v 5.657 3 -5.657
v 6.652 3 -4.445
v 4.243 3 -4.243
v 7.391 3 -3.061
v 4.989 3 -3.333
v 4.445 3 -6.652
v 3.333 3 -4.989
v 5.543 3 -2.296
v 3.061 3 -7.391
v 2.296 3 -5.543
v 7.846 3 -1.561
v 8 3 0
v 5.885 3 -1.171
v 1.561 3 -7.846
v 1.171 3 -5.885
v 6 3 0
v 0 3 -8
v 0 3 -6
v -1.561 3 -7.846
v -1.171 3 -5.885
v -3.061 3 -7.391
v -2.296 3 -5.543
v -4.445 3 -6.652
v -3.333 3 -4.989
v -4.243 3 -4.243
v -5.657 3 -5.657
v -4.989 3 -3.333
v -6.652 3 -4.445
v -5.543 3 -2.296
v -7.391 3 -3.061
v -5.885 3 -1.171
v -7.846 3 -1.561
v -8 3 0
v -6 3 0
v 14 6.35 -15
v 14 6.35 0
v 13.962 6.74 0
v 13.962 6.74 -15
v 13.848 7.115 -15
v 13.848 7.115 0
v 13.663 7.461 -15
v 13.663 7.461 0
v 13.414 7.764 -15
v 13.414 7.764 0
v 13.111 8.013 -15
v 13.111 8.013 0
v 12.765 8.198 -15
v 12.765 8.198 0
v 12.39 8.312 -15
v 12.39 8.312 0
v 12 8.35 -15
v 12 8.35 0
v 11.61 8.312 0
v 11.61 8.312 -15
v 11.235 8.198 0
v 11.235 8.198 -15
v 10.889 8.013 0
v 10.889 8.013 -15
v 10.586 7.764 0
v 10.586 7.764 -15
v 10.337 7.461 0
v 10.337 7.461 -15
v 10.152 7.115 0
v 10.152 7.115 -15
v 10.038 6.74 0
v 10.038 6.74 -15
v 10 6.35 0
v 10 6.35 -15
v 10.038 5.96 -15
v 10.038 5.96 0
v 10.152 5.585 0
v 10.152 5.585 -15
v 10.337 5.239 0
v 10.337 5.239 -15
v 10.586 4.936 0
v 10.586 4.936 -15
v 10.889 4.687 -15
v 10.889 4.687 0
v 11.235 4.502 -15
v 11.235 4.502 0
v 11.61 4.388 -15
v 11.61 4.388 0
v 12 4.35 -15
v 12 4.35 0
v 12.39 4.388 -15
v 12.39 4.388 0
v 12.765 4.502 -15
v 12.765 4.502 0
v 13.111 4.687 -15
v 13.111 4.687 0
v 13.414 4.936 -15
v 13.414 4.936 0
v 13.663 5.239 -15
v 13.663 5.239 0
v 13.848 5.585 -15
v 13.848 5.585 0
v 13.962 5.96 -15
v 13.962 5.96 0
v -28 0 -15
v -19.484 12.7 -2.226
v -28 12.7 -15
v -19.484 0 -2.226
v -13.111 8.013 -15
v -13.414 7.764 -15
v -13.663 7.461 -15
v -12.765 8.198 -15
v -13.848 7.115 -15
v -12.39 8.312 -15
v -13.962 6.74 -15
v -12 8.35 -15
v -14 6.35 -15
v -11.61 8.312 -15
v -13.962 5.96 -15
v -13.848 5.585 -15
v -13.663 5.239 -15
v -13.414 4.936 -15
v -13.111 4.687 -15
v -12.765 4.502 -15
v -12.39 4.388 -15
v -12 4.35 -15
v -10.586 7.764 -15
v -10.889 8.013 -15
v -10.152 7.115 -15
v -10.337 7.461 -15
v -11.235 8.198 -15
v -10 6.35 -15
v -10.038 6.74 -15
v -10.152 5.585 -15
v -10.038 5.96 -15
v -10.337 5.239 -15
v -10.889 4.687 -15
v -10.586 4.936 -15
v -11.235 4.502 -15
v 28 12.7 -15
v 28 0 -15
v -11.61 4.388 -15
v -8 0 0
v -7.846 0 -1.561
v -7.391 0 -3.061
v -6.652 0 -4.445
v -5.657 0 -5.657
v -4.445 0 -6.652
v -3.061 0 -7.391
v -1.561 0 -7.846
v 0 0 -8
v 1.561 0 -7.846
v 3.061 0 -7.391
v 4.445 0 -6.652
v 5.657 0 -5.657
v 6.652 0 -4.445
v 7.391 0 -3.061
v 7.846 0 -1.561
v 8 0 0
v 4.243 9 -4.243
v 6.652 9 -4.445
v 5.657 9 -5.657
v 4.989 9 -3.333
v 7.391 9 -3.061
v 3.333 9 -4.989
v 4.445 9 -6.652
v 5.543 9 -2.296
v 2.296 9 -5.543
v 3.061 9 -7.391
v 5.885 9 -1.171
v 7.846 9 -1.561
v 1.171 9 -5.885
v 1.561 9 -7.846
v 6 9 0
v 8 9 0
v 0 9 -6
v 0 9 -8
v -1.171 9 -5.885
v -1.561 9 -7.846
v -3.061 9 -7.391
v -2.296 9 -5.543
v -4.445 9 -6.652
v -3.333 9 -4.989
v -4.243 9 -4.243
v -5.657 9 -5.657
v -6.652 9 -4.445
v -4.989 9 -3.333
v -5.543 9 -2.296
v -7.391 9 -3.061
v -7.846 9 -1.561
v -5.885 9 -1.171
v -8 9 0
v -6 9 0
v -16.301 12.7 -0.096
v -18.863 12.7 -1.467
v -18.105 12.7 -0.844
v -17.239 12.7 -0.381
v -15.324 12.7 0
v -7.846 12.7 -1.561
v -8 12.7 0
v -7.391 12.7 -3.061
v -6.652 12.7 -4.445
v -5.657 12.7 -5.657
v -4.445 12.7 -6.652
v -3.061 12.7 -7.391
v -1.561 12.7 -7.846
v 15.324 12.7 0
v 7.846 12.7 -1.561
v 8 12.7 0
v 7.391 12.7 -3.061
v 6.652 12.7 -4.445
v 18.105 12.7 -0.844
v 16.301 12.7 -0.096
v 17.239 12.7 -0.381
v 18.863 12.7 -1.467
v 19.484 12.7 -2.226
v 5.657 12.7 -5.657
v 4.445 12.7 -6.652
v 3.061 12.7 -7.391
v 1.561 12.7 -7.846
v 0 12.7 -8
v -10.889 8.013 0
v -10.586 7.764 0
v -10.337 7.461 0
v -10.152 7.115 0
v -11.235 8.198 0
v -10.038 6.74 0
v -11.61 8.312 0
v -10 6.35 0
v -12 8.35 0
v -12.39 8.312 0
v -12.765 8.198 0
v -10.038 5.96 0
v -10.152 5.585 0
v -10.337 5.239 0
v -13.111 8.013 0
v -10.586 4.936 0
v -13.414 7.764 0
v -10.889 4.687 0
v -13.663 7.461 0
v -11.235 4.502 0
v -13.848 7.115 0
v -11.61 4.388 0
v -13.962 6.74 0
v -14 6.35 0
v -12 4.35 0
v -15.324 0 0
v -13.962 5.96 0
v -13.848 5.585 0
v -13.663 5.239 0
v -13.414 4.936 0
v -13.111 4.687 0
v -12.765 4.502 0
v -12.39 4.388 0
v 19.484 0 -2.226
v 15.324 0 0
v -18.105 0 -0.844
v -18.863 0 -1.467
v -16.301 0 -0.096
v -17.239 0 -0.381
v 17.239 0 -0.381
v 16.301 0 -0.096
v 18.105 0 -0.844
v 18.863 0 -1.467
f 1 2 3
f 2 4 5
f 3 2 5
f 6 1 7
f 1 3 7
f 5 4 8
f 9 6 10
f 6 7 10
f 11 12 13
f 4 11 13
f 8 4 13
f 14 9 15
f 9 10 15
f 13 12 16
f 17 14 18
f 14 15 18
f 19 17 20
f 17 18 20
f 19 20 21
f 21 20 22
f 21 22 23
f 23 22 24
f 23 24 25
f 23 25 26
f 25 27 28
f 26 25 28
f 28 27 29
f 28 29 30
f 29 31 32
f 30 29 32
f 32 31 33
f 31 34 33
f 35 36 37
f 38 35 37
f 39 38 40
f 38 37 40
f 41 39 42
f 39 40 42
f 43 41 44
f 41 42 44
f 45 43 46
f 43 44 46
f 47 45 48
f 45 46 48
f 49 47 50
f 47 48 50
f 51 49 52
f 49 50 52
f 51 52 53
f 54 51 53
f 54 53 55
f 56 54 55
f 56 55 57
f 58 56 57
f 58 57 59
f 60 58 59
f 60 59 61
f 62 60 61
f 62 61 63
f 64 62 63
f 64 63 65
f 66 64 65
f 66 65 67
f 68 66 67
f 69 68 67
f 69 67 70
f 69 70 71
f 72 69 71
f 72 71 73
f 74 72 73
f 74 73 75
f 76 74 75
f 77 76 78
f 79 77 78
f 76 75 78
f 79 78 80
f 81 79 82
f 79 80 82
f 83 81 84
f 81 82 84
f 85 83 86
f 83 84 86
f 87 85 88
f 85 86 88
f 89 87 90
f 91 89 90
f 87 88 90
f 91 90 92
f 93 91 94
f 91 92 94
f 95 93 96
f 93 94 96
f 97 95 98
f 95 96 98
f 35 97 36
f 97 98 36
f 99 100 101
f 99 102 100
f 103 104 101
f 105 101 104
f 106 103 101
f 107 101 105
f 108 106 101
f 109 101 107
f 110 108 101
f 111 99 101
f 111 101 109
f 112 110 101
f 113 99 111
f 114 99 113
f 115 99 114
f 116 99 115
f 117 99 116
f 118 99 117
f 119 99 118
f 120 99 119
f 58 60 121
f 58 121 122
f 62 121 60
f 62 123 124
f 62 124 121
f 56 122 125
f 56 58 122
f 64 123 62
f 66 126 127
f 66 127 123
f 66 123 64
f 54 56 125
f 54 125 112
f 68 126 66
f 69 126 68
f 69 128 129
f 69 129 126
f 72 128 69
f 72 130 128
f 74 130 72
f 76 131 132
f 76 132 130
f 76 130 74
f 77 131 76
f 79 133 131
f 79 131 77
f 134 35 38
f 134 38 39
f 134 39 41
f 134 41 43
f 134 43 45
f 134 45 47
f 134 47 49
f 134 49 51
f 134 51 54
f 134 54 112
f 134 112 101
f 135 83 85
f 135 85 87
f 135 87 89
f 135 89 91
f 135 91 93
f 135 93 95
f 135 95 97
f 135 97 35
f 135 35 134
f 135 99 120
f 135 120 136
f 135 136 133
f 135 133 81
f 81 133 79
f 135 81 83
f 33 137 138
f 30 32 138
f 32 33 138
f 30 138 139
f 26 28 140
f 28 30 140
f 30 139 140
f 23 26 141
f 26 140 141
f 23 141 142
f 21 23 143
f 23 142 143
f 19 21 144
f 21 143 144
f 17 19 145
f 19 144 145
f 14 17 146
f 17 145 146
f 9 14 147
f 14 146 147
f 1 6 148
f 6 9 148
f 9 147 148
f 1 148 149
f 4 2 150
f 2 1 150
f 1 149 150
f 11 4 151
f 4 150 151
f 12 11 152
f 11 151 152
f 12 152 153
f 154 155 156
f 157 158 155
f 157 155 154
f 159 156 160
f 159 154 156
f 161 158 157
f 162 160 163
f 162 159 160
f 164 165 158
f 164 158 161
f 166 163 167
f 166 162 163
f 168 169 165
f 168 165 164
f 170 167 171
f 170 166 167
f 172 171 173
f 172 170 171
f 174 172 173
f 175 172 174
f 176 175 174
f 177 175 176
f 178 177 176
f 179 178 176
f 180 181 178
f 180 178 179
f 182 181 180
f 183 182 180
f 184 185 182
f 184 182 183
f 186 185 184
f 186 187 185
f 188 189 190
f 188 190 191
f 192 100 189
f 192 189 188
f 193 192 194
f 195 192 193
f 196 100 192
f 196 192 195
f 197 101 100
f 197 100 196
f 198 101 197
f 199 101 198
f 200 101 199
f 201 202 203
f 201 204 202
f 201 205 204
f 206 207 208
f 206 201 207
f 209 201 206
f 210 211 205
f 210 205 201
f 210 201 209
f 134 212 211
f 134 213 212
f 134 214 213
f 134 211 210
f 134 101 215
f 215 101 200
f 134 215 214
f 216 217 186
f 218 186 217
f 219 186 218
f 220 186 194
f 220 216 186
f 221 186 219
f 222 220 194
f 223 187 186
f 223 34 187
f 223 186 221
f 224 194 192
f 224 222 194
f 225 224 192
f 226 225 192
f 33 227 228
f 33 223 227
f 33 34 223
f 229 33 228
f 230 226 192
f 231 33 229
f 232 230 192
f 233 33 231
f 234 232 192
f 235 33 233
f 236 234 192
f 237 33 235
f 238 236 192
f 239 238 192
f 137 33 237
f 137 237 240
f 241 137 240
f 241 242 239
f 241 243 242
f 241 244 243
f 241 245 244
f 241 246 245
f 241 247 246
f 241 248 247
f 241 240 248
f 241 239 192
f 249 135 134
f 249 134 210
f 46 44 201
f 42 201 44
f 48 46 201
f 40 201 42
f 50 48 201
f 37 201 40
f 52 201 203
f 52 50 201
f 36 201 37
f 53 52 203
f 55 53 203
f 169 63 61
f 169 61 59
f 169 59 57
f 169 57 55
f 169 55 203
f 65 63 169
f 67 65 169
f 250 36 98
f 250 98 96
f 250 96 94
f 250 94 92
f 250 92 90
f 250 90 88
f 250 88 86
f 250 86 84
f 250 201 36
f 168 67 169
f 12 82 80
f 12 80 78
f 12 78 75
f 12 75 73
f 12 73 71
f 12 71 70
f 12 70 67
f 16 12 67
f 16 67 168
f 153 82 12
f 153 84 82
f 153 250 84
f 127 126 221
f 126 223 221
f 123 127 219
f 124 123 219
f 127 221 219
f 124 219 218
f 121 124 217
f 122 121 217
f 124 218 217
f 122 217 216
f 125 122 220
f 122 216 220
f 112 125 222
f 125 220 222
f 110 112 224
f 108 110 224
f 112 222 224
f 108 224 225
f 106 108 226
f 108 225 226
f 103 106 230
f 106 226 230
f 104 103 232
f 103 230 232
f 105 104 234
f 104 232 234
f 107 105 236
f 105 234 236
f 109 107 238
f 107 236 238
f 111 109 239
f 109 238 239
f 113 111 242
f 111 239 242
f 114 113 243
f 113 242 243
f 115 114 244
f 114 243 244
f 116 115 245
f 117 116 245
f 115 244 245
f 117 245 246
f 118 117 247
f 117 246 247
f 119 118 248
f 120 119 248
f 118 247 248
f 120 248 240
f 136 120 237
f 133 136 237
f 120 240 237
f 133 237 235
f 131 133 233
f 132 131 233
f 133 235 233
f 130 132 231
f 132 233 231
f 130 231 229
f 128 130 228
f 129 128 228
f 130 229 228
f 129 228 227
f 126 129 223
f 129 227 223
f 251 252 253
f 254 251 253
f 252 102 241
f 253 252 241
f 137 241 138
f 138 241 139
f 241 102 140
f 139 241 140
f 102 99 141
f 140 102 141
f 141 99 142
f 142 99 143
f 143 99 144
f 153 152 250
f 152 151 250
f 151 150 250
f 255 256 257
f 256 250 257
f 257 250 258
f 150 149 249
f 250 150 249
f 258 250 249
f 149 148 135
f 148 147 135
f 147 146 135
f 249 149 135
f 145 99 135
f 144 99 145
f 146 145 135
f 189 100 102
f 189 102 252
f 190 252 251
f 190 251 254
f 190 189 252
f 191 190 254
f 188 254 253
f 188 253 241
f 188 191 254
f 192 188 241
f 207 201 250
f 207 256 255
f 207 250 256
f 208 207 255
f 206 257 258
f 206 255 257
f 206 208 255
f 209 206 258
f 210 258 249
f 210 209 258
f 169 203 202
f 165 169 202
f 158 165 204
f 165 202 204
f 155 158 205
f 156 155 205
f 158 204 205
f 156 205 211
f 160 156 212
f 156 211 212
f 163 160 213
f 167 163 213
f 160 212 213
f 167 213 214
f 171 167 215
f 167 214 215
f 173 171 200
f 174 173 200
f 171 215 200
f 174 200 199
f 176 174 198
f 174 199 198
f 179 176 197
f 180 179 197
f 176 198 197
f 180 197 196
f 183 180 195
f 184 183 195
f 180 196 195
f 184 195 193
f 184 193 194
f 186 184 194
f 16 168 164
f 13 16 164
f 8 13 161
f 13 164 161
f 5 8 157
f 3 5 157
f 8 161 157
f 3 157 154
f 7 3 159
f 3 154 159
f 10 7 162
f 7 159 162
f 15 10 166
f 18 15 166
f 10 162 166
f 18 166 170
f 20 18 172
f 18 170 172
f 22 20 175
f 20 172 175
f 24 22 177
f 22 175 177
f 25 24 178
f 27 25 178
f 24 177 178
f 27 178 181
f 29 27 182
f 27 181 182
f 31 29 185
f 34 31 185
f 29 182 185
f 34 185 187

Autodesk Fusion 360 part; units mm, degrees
sketch "Sketch1" plane through (0, 0, 0) normal (0, 1, 0) x (1, 0, 0)
  line L0 (-18, 0) -> (-28, 15)
  line L1 (-28, 15) -> (28, 15)
  line L2 (28, 15) -> (18, 0)
  line L3 (18, 0) -> (-18, 0)
  dimension "d1" = 10
  dimension "d2" = 10
  dimension "d3" = 56
  dimension "d21" = 15
extrude "Extrude1" add sketch "Sketch1" along normal blind 12.7
sketch "Sketch2" plane through (0, 12.7, 0) normal (0, 1, 0) x (-1, 0, 0)
  line L0 (-18, 0) -> (-28, -15)
  line L1 (-28, -15) -> (28, -15)
  line L2 (28, -15) -> (18, 0)
  line L3 (18, 0) -> (-18, 0)
  circle A0 centre (0, 0) radius 8
  circle A1 centre (0, 0) radius 6
  dimension "d7" = 16
  dimension "d8" = 12
extrude "Extrude2" cut sketch "Sketch2" against normal through all contours L3 A1 picked at (-1.4661, -1.3603)
extrude "Extrude3" cut sketch "Sketch2" against normal blind 3.7 contours L3 A0 A1 picked at (7.2812, -0.6955)
extrude "Extrude4" cut sketch "Sketch2" along normal blind 3 from surface at -12.7 contours L3 A0 A1 picked at (7.2812, -0.6955)
sketch "Sketch3" plane through (0, 0, 0) normal (0, 0, 1) x (1, 0, 0)
  line L0 (-8, 3) -> (-6, 3)
  line L1 (-6, 3) -> (-6, 9)
  line L2 (-6, 9) -> (-8, 9)
  line L3 (-8, 9) -> (-8, 12.7)
  line L4 (-8, 12.7) -> (-18, 12.7)
  line L5 (-18, 12.7) -> (-18, 0)
  line L6 (-18, 0) -> (-8, 0)
  line L7 (-8, 0) -> (-8, 3)
  line L8 (-12, 6.35) -> (12, 6.35)
  circle A0 centre (-12, 6.35) radius 2
  circle A1 centre (12, 6.35) radius 2
  dimension "d15" = 24
  dimension "d16" = 12
  dimension "d17" = 6.35
  dimension "d18" = 4
  dimension "d19" = 4
extrude "Extrude5" cut sketch "Sketch3" against normal through all contours A0 | A1
fillet "Fillet1" radius 5 2 edges at (-18, 6.35, 0) (18, 6.35, 0)
equation "d17 = ( 12.7 / 2 ) * 1 mm"
